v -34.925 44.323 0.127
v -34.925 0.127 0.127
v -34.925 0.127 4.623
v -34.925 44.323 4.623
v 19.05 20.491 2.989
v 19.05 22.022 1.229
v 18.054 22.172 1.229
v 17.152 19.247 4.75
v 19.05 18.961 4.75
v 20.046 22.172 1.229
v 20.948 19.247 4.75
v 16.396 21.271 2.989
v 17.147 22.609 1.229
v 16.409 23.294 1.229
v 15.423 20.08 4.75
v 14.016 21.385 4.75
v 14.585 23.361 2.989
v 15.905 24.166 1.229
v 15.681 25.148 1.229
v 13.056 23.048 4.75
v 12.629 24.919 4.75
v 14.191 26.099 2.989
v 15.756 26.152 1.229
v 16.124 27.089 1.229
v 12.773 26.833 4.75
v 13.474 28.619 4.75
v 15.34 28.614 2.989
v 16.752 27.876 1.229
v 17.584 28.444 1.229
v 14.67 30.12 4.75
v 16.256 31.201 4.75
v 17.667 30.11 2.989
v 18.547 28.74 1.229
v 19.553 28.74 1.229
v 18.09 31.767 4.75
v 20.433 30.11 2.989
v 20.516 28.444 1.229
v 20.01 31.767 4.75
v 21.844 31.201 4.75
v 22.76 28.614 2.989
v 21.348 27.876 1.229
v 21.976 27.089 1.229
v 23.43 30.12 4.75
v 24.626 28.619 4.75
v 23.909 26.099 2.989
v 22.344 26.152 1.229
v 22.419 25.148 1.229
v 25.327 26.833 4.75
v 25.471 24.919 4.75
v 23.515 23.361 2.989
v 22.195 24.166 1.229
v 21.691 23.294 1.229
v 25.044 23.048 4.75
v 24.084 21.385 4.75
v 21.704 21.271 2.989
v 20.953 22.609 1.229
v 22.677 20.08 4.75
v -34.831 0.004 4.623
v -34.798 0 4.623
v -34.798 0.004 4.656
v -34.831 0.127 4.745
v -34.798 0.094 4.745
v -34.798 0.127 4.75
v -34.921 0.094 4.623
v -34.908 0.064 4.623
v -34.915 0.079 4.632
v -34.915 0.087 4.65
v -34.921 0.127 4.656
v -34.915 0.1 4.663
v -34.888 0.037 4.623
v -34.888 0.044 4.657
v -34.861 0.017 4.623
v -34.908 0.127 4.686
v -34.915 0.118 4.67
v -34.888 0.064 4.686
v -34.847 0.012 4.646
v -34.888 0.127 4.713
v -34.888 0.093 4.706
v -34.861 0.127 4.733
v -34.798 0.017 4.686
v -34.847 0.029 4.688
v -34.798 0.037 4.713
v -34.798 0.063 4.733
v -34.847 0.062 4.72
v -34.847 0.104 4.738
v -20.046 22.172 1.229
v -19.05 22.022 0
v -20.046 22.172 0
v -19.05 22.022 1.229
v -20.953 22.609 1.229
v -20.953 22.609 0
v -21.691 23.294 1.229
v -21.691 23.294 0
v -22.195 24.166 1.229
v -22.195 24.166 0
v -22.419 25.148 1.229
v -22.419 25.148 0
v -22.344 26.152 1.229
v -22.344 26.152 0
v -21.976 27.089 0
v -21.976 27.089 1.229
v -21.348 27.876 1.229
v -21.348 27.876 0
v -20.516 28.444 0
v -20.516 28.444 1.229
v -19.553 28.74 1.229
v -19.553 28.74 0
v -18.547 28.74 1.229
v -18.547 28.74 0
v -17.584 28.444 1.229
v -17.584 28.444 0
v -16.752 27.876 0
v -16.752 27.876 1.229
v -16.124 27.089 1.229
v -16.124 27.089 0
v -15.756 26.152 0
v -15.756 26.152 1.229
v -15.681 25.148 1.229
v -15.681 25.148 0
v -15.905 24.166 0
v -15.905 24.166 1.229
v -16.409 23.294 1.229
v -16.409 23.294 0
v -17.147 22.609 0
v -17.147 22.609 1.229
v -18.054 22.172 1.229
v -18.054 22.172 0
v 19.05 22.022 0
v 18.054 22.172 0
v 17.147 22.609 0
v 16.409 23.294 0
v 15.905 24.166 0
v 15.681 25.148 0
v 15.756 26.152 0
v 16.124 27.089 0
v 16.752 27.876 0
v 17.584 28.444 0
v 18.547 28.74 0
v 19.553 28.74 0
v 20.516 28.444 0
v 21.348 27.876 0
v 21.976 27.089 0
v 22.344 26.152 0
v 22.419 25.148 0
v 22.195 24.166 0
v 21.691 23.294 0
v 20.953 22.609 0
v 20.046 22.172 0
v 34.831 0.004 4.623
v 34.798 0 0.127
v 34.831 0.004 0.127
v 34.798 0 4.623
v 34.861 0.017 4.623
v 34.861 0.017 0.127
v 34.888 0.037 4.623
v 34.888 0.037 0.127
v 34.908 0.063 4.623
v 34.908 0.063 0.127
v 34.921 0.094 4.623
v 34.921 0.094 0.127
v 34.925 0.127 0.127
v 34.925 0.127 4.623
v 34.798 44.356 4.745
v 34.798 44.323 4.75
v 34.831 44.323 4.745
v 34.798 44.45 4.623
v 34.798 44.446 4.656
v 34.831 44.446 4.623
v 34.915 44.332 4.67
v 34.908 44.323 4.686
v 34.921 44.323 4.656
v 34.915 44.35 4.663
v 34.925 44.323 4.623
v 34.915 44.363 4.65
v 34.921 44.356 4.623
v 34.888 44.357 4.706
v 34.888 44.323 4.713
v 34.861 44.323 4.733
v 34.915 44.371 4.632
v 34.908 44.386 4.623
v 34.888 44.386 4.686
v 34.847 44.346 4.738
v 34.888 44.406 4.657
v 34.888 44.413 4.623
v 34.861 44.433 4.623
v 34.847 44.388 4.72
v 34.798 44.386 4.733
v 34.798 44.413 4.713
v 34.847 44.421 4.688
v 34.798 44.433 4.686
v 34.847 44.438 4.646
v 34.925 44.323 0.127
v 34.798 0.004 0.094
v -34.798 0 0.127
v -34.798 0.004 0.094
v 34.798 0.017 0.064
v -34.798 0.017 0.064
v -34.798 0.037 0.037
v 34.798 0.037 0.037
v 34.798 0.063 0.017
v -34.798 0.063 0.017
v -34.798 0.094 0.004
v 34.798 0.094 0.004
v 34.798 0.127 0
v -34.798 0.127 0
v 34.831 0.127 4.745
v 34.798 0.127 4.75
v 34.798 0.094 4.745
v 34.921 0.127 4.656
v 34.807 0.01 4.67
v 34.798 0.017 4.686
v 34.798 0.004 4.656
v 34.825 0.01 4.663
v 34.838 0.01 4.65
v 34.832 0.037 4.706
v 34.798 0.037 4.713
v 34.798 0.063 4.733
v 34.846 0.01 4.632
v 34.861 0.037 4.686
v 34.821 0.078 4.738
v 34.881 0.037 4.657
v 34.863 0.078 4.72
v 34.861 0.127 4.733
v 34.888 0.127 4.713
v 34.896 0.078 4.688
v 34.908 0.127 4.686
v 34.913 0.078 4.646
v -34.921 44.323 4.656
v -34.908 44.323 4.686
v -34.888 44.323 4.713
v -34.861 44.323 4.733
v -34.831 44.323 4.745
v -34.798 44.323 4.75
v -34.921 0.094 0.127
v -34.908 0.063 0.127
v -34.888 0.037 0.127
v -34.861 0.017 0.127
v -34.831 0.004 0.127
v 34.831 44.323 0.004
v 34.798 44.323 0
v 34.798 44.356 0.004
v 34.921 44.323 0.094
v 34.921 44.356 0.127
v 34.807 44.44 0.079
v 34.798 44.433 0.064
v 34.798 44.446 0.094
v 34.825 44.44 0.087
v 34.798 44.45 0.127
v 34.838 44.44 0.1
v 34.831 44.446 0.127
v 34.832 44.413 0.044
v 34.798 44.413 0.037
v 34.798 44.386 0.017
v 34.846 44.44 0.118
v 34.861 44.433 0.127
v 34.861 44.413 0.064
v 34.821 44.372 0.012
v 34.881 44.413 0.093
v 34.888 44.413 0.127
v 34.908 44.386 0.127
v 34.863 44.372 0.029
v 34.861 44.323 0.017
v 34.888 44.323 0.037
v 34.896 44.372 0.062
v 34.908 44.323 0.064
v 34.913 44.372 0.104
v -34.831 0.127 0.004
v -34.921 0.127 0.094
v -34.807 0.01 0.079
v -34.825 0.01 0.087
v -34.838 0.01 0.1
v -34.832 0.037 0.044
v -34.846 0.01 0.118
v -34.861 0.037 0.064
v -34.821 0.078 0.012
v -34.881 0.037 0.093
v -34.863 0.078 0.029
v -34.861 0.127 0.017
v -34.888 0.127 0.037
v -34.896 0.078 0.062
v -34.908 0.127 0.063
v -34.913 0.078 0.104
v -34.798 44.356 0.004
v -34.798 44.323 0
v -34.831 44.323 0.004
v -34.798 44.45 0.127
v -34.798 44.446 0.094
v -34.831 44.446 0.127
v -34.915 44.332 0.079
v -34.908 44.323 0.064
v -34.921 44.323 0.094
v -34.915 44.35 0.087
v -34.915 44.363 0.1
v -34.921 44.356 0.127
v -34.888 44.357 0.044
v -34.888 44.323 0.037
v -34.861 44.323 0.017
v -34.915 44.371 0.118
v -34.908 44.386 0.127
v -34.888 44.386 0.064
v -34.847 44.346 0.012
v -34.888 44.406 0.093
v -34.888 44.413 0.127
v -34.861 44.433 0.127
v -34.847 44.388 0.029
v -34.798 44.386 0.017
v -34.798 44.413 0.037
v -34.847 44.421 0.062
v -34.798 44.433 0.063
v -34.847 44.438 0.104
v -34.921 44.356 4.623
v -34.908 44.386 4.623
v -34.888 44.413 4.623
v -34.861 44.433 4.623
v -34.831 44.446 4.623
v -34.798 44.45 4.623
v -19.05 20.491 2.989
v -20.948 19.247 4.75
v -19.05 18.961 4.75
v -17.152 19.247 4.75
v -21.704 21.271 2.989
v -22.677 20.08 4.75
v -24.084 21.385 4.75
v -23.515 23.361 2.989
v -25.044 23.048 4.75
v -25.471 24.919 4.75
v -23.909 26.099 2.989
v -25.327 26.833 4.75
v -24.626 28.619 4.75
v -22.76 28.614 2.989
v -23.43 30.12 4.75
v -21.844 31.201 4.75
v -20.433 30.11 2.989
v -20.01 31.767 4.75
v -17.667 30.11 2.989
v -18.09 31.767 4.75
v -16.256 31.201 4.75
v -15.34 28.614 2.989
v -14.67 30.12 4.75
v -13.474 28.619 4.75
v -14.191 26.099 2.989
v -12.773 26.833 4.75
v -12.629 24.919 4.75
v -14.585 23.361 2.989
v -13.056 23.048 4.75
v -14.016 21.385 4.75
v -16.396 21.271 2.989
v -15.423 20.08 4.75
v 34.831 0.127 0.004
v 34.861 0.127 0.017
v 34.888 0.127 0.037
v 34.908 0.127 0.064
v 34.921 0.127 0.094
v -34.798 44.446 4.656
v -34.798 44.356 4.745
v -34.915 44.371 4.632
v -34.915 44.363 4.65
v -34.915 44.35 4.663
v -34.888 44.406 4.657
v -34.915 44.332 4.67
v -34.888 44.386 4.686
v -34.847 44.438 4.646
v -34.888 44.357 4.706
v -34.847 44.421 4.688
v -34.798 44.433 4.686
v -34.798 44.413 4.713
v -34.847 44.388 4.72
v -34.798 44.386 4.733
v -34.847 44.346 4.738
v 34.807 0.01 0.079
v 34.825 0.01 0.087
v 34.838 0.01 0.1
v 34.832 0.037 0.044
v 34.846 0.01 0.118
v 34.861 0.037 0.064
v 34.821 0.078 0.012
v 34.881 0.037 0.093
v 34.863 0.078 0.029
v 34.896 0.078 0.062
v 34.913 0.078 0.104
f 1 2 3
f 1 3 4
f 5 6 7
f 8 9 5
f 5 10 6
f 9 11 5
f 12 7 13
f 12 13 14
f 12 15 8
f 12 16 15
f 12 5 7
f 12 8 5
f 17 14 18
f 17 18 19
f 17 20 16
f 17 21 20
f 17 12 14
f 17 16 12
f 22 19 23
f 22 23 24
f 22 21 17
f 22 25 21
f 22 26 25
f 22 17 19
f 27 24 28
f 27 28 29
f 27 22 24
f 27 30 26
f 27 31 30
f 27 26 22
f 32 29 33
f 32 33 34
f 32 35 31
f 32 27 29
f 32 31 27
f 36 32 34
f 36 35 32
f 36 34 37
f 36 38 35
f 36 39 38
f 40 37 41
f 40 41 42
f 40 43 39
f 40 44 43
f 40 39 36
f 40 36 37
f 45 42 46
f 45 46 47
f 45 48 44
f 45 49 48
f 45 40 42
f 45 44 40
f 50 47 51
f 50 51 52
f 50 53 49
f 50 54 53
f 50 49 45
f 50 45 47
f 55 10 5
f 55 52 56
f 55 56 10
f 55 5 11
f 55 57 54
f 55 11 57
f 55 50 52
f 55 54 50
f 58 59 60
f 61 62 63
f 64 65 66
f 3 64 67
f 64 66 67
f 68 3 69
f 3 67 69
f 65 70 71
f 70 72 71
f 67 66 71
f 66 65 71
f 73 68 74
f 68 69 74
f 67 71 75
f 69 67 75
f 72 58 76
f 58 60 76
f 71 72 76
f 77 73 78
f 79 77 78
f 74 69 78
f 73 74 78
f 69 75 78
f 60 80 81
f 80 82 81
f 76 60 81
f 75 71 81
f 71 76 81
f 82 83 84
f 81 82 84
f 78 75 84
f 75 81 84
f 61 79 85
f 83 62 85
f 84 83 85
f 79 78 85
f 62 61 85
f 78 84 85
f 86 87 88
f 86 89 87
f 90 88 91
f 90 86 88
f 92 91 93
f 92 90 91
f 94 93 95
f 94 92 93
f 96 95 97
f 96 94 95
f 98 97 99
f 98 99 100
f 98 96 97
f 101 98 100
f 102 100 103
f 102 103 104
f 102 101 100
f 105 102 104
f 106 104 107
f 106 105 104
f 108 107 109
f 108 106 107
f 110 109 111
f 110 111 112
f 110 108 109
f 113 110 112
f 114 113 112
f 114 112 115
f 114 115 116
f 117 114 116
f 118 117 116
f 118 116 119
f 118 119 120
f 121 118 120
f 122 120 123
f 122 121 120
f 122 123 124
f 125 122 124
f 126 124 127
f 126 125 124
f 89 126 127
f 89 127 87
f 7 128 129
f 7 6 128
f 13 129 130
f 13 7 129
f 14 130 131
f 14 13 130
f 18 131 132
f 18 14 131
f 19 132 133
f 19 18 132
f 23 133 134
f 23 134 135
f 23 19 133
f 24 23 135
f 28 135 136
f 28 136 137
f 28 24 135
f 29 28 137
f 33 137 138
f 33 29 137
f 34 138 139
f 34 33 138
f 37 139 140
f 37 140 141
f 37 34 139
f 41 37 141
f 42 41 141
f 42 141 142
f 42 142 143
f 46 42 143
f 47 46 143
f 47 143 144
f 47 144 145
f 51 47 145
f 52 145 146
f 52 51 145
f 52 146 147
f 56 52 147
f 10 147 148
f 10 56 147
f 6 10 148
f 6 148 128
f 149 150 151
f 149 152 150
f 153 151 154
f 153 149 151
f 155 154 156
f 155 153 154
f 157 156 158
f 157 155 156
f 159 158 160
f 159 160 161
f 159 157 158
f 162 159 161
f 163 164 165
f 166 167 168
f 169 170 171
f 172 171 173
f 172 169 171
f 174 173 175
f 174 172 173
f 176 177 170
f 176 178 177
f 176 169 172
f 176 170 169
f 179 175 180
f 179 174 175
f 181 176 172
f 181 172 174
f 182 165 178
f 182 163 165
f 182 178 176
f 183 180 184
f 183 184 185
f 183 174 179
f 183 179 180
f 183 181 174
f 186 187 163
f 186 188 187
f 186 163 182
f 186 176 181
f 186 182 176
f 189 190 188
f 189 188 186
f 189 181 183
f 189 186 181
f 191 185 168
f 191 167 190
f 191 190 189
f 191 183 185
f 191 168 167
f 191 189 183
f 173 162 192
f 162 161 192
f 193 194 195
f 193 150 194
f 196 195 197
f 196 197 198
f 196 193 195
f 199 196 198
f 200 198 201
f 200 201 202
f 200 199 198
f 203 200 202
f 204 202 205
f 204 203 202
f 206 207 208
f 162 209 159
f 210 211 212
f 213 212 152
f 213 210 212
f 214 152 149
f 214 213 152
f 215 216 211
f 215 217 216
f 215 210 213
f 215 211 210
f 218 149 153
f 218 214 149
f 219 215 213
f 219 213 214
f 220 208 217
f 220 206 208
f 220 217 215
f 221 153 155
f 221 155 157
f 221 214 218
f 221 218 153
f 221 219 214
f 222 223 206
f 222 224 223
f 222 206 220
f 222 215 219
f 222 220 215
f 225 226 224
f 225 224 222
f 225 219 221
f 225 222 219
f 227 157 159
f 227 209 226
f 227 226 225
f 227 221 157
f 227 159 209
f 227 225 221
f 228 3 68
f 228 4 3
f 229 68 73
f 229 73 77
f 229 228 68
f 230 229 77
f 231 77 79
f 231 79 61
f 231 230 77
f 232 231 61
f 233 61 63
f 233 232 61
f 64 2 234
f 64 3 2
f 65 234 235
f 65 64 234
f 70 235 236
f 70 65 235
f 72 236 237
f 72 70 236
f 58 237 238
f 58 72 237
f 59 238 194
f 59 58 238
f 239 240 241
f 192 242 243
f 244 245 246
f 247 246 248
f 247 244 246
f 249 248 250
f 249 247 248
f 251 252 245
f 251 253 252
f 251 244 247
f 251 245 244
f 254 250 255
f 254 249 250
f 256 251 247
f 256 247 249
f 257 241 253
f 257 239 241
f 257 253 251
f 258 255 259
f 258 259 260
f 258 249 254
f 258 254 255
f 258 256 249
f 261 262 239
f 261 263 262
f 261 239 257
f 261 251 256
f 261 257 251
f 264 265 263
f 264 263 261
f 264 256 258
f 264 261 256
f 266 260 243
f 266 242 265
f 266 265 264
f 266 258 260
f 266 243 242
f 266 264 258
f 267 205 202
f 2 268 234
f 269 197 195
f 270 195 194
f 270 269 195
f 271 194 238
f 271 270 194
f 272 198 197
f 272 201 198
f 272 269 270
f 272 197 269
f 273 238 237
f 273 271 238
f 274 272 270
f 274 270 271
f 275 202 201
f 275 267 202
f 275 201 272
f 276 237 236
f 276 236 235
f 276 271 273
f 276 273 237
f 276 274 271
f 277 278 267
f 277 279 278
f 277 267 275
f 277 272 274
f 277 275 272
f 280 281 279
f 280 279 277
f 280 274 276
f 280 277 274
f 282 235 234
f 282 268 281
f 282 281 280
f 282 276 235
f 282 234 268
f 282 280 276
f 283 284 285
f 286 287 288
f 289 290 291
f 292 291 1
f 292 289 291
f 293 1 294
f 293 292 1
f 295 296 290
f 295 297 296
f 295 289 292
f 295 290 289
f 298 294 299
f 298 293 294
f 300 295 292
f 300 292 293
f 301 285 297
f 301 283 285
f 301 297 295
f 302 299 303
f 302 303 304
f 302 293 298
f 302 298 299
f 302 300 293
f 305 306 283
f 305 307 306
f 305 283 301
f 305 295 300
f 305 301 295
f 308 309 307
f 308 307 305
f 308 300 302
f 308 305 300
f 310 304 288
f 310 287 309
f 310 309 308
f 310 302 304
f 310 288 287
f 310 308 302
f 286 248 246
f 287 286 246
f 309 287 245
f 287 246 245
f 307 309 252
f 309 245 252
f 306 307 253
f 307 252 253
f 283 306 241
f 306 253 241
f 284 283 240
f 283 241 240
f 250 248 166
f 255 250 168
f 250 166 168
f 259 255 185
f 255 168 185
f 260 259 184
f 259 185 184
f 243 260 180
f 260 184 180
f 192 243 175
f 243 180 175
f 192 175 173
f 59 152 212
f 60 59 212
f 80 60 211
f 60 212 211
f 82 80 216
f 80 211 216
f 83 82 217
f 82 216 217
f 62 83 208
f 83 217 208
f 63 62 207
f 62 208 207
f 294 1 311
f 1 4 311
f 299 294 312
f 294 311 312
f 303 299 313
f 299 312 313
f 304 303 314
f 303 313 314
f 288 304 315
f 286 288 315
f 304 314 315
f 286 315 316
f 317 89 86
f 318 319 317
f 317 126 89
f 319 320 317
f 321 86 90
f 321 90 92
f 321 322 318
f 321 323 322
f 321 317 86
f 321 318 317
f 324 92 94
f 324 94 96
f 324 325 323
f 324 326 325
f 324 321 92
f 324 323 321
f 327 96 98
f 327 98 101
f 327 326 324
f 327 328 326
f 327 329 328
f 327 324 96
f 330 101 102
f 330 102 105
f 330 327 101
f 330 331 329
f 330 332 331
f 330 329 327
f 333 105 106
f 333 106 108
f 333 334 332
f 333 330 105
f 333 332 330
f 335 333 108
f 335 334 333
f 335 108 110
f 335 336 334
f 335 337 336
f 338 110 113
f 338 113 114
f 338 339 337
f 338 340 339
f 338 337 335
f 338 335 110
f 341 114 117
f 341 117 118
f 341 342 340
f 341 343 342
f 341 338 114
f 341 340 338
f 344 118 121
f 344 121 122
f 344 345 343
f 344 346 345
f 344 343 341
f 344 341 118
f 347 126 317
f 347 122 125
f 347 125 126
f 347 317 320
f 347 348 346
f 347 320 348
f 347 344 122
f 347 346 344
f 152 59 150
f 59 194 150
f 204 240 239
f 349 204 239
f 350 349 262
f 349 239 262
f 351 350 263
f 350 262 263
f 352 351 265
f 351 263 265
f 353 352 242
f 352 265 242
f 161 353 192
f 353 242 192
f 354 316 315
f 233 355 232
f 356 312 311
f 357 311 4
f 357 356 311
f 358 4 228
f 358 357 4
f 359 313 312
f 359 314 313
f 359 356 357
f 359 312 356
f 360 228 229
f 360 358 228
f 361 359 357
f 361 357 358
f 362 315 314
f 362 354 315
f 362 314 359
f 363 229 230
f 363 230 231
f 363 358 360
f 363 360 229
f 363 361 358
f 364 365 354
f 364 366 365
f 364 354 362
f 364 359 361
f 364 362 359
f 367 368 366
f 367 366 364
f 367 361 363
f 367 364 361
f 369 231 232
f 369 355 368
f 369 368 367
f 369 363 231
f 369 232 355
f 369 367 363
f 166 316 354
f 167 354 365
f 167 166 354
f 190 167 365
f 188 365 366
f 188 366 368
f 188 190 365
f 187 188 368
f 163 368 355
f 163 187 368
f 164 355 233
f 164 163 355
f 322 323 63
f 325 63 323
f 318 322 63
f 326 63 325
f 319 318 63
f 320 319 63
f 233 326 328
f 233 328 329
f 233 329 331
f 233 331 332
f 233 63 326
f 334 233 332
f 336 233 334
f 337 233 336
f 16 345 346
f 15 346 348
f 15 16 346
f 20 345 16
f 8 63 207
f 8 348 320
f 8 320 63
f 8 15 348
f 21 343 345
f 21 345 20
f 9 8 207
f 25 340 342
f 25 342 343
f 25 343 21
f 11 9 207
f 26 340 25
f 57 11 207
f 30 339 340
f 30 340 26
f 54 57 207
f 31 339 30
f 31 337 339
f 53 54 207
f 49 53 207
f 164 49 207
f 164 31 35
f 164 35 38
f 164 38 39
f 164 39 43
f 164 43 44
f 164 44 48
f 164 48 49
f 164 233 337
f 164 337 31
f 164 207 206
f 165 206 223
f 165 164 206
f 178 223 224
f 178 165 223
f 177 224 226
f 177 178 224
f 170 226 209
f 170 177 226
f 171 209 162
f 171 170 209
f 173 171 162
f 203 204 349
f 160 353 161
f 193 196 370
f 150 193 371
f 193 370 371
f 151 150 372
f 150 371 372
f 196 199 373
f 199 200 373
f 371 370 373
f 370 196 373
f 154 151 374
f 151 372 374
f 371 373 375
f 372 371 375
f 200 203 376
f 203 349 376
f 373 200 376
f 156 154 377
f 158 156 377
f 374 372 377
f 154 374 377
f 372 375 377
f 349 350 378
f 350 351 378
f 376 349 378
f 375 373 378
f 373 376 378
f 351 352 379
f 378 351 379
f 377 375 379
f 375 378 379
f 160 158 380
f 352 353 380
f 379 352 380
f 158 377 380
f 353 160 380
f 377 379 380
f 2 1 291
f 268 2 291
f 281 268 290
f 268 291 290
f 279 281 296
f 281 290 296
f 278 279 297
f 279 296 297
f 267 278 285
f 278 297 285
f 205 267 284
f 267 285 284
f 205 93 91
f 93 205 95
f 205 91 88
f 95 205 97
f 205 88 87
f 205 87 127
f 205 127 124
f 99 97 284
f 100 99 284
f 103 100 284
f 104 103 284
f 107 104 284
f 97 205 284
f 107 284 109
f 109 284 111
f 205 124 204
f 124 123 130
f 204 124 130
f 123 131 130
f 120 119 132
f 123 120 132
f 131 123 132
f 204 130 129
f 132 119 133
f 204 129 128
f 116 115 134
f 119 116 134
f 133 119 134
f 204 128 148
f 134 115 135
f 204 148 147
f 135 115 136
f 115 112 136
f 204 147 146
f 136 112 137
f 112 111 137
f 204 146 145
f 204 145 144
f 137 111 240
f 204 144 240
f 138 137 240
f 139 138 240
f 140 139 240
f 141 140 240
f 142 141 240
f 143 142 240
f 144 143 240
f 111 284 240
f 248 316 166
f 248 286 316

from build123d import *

# Parameters (mm, degrees)
SKETCH1_W                                     = 69.85
SKETCH1_H                                     = 44.45
BOSS_EXTRUDE1_DEPTH                           = 4.7498
CSK_FOR_1_4_FLAT_HEAD_MACHINE_SCREW1_AT_COUNT = 2
CSK_FOR_1_4_FLAT_HEAD_MACHINE_SCREW1_AT_PITCH = 38.1
FILLET1_R                                     = 0.127


with BuildPart() as part:
    # Sketch1 → Boss-Extrude1 (new body)
    with BuildSketch(Plane.XY):
        with Locations((0, 22.225)):
            Rectangle(SKETCH1_W, SKETCH1_H)
    extrude(amount=BOSS_EXTRUDE1_DEPTH)

    # Sketch4 → CSK for 1/4 Flat Head Machine Screw1 (revolve, cut)
    with BuildSketch(Plane(origin=(19.05, 25.4, 4.7498), x_dir=(0, -1, 0), z_dir=(1, 0, 0))):
        Polygon((0, 0), (0, 4.7498), (3.3782, 4.7498), (3.3782, 3.520932584), (6.4389, 0), align=None)
    csk_for_1_4_flat_head_machine_screw1 = revolve(axis=Axis((19.05, 25.4, 11.0998), (0, 0, -1)), mode=Mode.SUBTRACT)

    # CSK for 1/4 Flat Head Machine Screw1 at: CSK for 1/4 Flat Head Machine Screw1 ×2
    with Locations(*[(-i * CSK_FOR_1_4_FLAT_HEAD_MACHINE_SCREW1_AT_PITCH, 0, 0) for i in range(1, CSK_FOR_1_4_FLAT_HEAD_MACHINE_SCREW1_AT_COUNT)]):
        add(csk_for_1_4_flat_head_machine_screw1, mode=Mode.SUBTRACT)

    # Fillet1
    fillet1_edges = [part.edges().sort_by_distance(p)[0] for p in [
        (0, 44.45, 4.7498),
        (34.925, 22.225, 4.7498),
        (0, 0, 4.7498),
        (34.925, 22.225, 0),
        (0, 44.45, 0),
        (-34.925, 22.225, 0),
        (0, 0, 0),
        (34.925, 0, 2.3749),
        (34.925, 44.45, 2.3749),
        (-34.925, 44.45, 2.3749),
        (-34.925, 0, 2.3749),
        (-34.925, 22.225, 4.7498),
    ]]
    fillet(fillet1_edges, radius=FILLET1_R)


solid = part.part
